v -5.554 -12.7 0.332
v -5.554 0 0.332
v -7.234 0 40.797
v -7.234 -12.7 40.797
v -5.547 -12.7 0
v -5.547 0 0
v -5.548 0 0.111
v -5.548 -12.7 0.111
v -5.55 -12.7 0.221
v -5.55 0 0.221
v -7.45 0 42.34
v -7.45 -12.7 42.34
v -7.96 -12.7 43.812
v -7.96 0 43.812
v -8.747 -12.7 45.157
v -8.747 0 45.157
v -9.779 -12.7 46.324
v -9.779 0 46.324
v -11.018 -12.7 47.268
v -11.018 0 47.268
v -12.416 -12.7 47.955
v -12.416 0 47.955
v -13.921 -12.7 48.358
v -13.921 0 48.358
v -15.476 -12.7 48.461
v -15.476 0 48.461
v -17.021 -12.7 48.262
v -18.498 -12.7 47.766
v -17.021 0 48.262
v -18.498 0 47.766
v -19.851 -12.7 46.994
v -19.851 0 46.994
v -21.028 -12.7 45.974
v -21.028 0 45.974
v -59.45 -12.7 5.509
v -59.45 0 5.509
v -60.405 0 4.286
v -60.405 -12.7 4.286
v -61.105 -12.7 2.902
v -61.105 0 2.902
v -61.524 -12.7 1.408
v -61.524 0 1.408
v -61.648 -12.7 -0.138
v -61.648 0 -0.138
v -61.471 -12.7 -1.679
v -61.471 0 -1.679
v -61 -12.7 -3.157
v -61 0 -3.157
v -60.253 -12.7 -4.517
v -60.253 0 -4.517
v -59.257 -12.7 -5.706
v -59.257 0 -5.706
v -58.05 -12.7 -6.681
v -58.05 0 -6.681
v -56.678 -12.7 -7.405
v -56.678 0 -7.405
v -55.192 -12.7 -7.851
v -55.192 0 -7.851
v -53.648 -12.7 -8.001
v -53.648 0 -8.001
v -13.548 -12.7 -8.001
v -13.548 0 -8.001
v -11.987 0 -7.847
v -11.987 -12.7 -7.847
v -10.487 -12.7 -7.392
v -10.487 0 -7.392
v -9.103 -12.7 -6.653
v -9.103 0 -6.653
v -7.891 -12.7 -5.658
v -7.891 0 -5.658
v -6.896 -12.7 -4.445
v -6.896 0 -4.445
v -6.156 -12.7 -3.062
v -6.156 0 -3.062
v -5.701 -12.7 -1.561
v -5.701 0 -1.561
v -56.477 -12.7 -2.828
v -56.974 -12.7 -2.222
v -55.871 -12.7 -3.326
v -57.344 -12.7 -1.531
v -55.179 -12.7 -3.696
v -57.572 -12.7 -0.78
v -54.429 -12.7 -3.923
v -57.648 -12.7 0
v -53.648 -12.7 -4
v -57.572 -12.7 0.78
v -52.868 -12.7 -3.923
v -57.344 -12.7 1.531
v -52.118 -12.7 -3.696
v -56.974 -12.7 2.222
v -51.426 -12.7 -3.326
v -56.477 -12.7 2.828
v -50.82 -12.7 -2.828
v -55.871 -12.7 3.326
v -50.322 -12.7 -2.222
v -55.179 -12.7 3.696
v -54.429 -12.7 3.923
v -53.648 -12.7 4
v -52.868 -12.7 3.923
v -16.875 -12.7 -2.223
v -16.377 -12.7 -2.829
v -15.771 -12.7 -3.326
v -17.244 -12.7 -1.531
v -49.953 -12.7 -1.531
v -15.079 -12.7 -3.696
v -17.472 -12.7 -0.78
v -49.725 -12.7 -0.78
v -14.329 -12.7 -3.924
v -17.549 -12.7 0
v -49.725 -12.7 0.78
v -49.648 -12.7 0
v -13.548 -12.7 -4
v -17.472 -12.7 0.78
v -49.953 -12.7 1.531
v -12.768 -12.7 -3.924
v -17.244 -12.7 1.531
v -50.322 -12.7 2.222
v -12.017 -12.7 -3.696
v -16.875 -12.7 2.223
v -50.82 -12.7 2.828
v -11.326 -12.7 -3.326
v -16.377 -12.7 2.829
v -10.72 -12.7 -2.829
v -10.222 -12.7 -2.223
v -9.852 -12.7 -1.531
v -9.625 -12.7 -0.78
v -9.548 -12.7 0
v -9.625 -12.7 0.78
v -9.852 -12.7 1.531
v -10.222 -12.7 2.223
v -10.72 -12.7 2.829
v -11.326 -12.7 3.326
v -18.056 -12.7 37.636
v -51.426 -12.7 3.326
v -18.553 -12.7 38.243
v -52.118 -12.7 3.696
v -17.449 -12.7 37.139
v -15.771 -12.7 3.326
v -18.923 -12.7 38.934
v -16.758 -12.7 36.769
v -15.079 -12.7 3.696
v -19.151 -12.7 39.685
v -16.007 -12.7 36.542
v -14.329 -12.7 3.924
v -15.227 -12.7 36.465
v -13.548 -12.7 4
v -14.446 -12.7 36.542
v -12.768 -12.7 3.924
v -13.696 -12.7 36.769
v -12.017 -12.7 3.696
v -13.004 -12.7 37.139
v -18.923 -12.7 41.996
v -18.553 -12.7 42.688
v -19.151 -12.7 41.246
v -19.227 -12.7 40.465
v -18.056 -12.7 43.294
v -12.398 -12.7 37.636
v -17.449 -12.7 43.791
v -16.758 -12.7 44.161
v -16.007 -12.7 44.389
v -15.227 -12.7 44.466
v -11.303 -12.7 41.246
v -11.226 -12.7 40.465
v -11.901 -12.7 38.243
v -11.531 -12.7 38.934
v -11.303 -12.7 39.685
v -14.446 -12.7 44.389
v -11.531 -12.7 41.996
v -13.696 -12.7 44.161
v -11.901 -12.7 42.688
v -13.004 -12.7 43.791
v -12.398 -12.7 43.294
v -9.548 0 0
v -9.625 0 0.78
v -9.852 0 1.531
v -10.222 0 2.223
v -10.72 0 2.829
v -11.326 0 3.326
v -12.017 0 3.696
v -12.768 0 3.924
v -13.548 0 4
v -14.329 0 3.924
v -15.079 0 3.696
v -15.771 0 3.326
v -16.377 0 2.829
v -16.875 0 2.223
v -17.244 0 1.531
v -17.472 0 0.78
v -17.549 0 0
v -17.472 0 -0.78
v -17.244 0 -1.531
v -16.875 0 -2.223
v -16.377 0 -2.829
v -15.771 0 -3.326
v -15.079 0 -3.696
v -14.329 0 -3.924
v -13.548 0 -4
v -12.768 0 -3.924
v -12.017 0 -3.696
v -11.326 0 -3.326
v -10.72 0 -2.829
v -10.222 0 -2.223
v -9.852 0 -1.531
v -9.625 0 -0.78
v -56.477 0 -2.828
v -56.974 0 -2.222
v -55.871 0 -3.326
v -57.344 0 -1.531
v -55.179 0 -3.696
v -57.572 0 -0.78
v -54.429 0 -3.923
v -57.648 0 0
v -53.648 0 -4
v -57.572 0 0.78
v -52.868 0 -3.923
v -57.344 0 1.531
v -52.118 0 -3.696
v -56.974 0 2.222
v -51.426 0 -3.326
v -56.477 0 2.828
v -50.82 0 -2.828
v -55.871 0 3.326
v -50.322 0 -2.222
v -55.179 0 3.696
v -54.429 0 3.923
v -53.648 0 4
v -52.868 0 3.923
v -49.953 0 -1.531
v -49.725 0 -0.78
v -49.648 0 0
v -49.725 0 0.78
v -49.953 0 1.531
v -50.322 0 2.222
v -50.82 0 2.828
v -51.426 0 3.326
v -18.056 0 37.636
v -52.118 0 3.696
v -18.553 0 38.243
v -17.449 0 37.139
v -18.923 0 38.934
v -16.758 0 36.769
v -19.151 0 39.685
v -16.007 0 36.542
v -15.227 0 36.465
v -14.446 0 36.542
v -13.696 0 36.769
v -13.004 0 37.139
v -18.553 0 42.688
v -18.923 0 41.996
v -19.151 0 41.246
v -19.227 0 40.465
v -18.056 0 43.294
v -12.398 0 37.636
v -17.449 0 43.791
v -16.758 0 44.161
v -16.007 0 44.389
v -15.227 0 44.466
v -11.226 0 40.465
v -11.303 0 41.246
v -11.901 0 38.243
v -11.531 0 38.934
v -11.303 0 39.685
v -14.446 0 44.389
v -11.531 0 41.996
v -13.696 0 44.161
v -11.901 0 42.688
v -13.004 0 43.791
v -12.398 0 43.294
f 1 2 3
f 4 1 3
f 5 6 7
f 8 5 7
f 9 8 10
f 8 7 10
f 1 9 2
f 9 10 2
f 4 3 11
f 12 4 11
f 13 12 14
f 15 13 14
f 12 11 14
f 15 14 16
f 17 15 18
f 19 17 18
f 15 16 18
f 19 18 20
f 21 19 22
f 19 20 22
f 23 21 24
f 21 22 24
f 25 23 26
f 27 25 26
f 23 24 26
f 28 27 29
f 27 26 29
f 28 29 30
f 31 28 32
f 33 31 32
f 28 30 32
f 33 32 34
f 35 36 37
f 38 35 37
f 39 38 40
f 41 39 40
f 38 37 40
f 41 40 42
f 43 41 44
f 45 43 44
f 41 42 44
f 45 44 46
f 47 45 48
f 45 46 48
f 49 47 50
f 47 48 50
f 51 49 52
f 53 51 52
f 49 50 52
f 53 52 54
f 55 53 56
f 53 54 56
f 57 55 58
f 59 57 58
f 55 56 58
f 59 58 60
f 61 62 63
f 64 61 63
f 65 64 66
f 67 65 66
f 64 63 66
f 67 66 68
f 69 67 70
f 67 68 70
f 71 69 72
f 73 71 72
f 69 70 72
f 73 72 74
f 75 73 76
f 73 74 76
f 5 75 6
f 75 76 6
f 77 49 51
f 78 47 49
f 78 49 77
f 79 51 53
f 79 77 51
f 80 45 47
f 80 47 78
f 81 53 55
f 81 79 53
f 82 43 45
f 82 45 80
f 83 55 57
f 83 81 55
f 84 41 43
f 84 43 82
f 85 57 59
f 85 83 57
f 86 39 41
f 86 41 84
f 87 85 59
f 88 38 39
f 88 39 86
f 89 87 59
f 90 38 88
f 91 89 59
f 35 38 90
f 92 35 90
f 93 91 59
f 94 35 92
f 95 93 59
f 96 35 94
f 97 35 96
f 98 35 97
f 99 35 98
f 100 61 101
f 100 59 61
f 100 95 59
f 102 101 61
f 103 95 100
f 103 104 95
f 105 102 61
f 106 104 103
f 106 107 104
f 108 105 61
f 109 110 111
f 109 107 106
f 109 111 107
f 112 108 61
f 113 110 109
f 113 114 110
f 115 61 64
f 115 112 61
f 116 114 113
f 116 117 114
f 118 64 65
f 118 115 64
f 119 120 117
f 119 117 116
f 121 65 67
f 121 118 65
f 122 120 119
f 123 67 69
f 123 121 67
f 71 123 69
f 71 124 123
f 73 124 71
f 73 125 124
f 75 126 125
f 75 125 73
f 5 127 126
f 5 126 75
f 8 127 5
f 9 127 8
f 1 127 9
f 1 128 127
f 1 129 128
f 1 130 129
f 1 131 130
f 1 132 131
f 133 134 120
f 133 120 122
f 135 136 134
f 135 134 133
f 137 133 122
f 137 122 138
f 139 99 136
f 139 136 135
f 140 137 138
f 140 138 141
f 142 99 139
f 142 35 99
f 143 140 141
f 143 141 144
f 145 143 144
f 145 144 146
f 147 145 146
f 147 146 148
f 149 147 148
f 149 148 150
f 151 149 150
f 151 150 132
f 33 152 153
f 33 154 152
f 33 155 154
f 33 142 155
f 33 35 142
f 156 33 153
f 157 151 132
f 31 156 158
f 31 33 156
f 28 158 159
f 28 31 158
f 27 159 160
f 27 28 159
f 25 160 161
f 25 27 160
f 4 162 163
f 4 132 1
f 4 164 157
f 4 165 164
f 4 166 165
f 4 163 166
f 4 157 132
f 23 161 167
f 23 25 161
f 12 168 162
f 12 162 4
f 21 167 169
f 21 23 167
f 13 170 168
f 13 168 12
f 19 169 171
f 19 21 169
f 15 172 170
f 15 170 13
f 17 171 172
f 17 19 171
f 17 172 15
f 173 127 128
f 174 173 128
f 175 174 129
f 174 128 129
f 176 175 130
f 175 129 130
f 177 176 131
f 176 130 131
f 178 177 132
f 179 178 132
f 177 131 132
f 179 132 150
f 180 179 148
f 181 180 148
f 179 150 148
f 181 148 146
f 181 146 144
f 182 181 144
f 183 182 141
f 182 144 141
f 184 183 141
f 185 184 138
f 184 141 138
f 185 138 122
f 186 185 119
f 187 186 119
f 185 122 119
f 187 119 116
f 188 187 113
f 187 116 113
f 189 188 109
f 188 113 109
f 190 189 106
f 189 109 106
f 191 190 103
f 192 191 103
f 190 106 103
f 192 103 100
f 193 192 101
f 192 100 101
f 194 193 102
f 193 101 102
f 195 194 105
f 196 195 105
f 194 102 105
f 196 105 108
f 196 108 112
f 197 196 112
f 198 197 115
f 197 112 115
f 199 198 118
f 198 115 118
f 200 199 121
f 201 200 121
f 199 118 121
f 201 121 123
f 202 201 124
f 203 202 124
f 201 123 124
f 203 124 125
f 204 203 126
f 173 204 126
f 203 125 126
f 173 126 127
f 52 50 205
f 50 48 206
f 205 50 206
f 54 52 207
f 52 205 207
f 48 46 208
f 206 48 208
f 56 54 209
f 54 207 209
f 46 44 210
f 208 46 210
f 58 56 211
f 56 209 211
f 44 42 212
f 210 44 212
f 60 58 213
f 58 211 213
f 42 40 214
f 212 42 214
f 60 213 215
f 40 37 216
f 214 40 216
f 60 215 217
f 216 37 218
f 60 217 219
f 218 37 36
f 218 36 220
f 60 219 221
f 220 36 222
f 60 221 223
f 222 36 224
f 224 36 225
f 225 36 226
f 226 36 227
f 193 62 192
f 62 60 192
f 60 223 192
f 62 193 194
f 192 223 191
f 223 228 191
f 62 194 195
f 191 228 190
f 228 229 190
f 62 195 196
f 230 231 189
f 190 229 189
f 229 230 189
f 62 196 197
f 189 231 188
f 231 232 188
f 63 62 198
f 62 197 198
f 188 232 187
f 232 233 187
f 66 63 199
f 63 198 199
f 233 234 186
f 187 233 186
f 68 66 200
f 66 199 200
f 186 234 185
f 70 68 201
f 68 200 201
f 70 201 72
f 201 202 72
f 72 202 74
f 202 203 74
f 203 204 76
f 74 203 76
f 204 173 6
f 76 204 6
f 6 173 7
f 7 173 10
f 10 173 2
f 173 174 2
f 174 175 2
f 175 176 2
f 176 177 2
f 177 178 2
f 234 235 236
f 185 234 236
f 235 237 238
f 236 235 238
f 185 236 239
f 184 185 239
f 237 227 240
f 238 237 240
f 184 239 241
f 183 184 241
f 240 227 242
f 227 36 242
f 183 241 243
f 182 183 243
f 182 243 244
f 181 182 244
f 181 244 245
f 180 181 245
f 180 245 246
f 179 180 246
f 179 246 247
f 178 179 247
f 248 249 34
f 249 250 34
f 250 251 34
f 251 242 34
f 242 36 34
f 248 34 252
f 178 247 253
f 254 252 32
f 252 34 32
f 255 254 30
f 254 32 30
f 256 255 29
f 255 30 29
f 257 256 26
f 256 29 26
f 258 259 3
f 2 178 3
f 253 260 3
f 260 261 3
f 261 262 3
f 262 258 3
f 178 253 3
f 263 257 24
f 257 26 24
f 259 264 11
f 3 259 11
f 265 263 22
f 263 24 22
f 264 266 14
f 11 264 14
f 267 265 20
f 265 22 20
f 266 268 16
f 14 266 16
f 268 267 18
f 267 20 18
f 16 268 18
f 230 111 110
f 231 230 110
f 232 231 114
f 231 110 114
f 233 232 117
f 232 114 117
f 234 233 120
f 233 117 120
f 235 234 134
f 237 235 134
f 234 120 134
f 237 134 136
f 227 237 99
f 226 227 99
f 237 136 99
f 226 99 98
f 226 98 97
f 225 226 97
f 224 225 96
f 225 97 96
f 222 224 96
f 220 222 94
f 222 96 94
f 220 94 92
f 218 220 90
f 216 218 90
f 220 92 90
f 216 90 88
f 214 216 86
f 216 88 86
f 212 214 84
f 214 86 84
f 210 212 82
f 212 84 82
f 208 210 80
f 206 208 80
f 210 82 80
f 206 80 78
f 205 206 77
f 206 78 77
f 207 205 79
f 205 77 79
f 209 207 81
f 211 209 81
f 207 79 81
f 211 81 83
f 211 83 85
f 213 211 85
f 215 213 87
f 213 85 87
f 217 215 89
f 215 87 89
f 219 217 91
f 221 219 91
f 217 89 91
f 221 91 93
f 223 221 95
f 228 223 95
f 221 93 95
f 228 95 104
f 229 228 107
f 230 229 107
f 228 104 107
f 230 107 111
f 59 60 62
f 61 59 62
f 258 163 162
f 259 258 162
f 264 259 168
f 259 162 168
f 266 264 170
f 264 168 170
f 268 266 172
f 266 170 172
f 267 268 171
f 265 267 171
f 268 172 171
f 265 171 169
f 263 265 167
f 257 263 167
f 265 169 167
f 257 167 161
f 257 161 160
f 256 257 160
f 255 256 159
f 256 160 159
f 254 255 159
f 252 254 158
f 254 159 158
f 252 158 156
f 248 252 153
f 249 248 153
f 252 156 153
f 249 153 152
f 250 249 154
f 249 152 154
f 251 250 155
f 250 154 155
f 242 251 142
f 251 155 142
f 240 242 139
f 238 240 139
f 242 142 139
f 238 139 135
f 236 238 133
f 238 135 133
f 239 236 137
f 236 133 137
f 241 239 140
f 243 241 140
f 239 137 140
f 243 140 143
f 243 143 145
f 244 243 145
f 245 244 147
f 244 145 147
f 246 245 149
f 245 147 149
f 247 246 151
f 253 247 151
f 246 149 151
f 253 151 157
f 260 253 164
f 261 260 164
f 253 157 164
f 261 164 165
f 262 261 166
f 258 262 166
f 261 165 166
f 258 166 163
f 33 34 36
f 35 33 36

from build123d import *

# Parameters (mm, degrees)
F1_DEPTH = 12.7
F2_R     = 4.0005
F2_R_2   = 4
F3_DEPTH = 12.7


with BuildPart() as f1:
    # F0 (on Front) → F1 (new body)
    with BuildSketch(Plane.XZ):
        with BuildLine():
            Line((-13.8799677983, 7.9941251807), (-13.5483602062, 0))
            Line((-13.5483602062, 0), (-21.5493602062, 0))
            ThreePointArc((-21.5493602062, 0), (-19.2059215625, -5.6575613563), (-13.5483602062, -8.001))
            ThreePointArc((-13.5483602062, -8.001), (-7.8907988499, -5.6575613563), (-5.5473602062, 0))
            ThreePointArc((-5.5473602062, 0), (-5.5490811437, 0.1659381806), (-5.5542432158, 0.3318049778))
            ThreePointArc((-5.5542432158, 0.3318049778), (-8.13021474, 5.8872489932), (-13.8799677983, 7.9941251807))
        make_face()
        with BuildLine():
            Line((-14.8953476758, 32.4720745373), (-13.8799677983, 7.9941251807))
            ThreePointArc((-13.8799677983, 7.9941251807), (-8.13021474, 5.8872489932), (-5.5542432158, 0.3318049778))
            Line((-5.5542432158, 0.3318049778), (-7.2337959714, 40.7969640847))
            ThreePointArc((-7.2337959714, 40.7969640847), (-7.2286345445, 40.6311180182), (-7.2269138221, 40.4652005773))
            ThreePointArc((-7.2269138221, 40.4652005773), (-9.4540233342, 34.9268131392), (-14.8953476758, 32.4720745373))
        make_face()
        with BuildLine():
            Line((-15.2269138221, 40.4652005773), (-14.8953476758, 32.4720745373))
            ThreePointArc((-14.8953476758, 32.4720745373), (-9.4540233342, 34.9268131392), (-7.2269138221, 40.4652005773))
            ThreePointArc((-7.2269138221, 40.4652005773), (-7.2286345445, 40.6311180182), (-7.2337959714, 40.7969640847))
            ThreePointArc((-7.2337959714, 40.7969640847), (-12.4160884571, 47.9551445535), (-21.0282775518, 45.9737556397))
            ThreePointArc((-21.0282775518, 45.9737556397), (-23.2242322391, 40.2580819225), (-20.7353649166, 34.6637381289))
            Line((-20.7353649166, 34.6637381289), (-15.2269138221, 40.4652005773))
        make_face()
        with BuildLine():
            Line((-48.1392205553, 5.8021876312), (-20.7353649166, 34.6637381289))
            ThreePointArc((-20.7353649166, 34.6637381289), (-23.2242322391, 40.2580819225), (-21.0282775518, 45.9737556397))
            Line((-21.0282775518, 45.9737556397), (-59.4504491063, 5.5092436318))
            ThreePointArc((-59.4504491063, 5.5092436318), (-53.8555047508, 7.9983180818), (-48.1392205553, 5.8021876312))
        make_face()
        with BuildLine():
            ThreePointArc((-53.6483602062, -8.001), (-47.9907988499, -5.6575613563), (-45.6473602062, 0))
            Line((-45.6473602062, 0), (-53.6483602062, 0))
            Line((-53.6483602062, 0), (-48.1392205553, 5.8021876312))
            ThreePointArc((-48.1392205553, 5.8021876312), (-53.8555047508, 7.9983180818), (-59.4504491063, 5.5092436318))
            ThreePointArc((-59.4504491063, 5.5092436318), (-61.0000763085, -3.1572569346), (-53.6483602062, -8.001))
        make_face()
        with BuildLine():
            ThreePointArc((-13.5483602062, -8.001), (-19.2059215625, -5.6575613563), (-21.5493602062, 0))
            Line((-21.5493602062, 0), (-45.6473602062, 0))
            ThreePointArc((-45.6473602062, 0), (-47.9907988499, -5.6575613563), (-53.6483602062, -8.001))
            Line((-53.6483602062, -8.001), (-13.5483602062, -8.001))
        make_face()
        with BuildLine():
            ThreePointArc((-21.5493602062, 0), (-19.3219723054, 5.5390797365), (-13.8799677983, 7.9941251807))
            Line((-13.8799677983, 7.9941251807), (-14.8953476758, 32.4720745373))
            ThreePointArc((-14.8953476758, 32.4720745373), (-18.0377645415, 32.975266116), (-20.7353649166, 34.6637381289))
            Line((-20.7353649166, 34.6637381289), (-48.1392205553, 5.8021876312))
            ThreePointArc((-48.1392205553, 5.8021876312), (-46.296672395, 3.15732281), (-45.6473602062, 0))
            Line((-45.6473602062, 0), (-21.5493602062, 0))
        make_face()
        with BuildLine():
            ThreePointArc((-20.7353649166, 34.6637381289), (-18.0377645415, 32.975266116), (-14.8953476758, 32.4720745373))
            Line((-14.8953476758, 32.4720745373), (-15.2269138221, 40.4652005773))
            Line((-15.2269138221, 40.4652005773), (-20.7353649166, 34.6637381289))
        make_face()
        with BuildLine():
            Line((-21.5493602062, 0), (-13.5483602062, 0))
            Line((-13.5483602062, 0), (-13.8799677983, 7.9941251807))
            ThreePointArc((-13.8799677983, 7.9941251807), (-19.3219723054, 5.5390797365), (-21.5493602062, 0))
        make_face()
        with BuildLine():
            Line((-53.6483602062, 0), (-45.6473602062, 0))
            ThreePointArc((-45.6473602062, 0), (-46.296672395, 3.15732281), (-48.1392205553, 5.8021876312))
            Line((-48.1392205553, 5.8021876312), (-53.6483602062, 0))
        make_face()
    extrude(amount=F1_DEPTH)

    # F2 (on face) → F3 (cut, through all)
    with BuildSketch(Plane.XZ.offset(12.7)):
        with Locations((-15.2269138221, 40.4652005773)):
            Circle(F2_R)
        with Locations((-13.5483602062, 0)):
            Circle(F2_R)
        with Locations((-53.6483602062, 0)):
            Circle(F2_R_2)
    extrude(amount=-F3_DEPTH, mode=Mode.SUBTRACT)


solid = f1.part
